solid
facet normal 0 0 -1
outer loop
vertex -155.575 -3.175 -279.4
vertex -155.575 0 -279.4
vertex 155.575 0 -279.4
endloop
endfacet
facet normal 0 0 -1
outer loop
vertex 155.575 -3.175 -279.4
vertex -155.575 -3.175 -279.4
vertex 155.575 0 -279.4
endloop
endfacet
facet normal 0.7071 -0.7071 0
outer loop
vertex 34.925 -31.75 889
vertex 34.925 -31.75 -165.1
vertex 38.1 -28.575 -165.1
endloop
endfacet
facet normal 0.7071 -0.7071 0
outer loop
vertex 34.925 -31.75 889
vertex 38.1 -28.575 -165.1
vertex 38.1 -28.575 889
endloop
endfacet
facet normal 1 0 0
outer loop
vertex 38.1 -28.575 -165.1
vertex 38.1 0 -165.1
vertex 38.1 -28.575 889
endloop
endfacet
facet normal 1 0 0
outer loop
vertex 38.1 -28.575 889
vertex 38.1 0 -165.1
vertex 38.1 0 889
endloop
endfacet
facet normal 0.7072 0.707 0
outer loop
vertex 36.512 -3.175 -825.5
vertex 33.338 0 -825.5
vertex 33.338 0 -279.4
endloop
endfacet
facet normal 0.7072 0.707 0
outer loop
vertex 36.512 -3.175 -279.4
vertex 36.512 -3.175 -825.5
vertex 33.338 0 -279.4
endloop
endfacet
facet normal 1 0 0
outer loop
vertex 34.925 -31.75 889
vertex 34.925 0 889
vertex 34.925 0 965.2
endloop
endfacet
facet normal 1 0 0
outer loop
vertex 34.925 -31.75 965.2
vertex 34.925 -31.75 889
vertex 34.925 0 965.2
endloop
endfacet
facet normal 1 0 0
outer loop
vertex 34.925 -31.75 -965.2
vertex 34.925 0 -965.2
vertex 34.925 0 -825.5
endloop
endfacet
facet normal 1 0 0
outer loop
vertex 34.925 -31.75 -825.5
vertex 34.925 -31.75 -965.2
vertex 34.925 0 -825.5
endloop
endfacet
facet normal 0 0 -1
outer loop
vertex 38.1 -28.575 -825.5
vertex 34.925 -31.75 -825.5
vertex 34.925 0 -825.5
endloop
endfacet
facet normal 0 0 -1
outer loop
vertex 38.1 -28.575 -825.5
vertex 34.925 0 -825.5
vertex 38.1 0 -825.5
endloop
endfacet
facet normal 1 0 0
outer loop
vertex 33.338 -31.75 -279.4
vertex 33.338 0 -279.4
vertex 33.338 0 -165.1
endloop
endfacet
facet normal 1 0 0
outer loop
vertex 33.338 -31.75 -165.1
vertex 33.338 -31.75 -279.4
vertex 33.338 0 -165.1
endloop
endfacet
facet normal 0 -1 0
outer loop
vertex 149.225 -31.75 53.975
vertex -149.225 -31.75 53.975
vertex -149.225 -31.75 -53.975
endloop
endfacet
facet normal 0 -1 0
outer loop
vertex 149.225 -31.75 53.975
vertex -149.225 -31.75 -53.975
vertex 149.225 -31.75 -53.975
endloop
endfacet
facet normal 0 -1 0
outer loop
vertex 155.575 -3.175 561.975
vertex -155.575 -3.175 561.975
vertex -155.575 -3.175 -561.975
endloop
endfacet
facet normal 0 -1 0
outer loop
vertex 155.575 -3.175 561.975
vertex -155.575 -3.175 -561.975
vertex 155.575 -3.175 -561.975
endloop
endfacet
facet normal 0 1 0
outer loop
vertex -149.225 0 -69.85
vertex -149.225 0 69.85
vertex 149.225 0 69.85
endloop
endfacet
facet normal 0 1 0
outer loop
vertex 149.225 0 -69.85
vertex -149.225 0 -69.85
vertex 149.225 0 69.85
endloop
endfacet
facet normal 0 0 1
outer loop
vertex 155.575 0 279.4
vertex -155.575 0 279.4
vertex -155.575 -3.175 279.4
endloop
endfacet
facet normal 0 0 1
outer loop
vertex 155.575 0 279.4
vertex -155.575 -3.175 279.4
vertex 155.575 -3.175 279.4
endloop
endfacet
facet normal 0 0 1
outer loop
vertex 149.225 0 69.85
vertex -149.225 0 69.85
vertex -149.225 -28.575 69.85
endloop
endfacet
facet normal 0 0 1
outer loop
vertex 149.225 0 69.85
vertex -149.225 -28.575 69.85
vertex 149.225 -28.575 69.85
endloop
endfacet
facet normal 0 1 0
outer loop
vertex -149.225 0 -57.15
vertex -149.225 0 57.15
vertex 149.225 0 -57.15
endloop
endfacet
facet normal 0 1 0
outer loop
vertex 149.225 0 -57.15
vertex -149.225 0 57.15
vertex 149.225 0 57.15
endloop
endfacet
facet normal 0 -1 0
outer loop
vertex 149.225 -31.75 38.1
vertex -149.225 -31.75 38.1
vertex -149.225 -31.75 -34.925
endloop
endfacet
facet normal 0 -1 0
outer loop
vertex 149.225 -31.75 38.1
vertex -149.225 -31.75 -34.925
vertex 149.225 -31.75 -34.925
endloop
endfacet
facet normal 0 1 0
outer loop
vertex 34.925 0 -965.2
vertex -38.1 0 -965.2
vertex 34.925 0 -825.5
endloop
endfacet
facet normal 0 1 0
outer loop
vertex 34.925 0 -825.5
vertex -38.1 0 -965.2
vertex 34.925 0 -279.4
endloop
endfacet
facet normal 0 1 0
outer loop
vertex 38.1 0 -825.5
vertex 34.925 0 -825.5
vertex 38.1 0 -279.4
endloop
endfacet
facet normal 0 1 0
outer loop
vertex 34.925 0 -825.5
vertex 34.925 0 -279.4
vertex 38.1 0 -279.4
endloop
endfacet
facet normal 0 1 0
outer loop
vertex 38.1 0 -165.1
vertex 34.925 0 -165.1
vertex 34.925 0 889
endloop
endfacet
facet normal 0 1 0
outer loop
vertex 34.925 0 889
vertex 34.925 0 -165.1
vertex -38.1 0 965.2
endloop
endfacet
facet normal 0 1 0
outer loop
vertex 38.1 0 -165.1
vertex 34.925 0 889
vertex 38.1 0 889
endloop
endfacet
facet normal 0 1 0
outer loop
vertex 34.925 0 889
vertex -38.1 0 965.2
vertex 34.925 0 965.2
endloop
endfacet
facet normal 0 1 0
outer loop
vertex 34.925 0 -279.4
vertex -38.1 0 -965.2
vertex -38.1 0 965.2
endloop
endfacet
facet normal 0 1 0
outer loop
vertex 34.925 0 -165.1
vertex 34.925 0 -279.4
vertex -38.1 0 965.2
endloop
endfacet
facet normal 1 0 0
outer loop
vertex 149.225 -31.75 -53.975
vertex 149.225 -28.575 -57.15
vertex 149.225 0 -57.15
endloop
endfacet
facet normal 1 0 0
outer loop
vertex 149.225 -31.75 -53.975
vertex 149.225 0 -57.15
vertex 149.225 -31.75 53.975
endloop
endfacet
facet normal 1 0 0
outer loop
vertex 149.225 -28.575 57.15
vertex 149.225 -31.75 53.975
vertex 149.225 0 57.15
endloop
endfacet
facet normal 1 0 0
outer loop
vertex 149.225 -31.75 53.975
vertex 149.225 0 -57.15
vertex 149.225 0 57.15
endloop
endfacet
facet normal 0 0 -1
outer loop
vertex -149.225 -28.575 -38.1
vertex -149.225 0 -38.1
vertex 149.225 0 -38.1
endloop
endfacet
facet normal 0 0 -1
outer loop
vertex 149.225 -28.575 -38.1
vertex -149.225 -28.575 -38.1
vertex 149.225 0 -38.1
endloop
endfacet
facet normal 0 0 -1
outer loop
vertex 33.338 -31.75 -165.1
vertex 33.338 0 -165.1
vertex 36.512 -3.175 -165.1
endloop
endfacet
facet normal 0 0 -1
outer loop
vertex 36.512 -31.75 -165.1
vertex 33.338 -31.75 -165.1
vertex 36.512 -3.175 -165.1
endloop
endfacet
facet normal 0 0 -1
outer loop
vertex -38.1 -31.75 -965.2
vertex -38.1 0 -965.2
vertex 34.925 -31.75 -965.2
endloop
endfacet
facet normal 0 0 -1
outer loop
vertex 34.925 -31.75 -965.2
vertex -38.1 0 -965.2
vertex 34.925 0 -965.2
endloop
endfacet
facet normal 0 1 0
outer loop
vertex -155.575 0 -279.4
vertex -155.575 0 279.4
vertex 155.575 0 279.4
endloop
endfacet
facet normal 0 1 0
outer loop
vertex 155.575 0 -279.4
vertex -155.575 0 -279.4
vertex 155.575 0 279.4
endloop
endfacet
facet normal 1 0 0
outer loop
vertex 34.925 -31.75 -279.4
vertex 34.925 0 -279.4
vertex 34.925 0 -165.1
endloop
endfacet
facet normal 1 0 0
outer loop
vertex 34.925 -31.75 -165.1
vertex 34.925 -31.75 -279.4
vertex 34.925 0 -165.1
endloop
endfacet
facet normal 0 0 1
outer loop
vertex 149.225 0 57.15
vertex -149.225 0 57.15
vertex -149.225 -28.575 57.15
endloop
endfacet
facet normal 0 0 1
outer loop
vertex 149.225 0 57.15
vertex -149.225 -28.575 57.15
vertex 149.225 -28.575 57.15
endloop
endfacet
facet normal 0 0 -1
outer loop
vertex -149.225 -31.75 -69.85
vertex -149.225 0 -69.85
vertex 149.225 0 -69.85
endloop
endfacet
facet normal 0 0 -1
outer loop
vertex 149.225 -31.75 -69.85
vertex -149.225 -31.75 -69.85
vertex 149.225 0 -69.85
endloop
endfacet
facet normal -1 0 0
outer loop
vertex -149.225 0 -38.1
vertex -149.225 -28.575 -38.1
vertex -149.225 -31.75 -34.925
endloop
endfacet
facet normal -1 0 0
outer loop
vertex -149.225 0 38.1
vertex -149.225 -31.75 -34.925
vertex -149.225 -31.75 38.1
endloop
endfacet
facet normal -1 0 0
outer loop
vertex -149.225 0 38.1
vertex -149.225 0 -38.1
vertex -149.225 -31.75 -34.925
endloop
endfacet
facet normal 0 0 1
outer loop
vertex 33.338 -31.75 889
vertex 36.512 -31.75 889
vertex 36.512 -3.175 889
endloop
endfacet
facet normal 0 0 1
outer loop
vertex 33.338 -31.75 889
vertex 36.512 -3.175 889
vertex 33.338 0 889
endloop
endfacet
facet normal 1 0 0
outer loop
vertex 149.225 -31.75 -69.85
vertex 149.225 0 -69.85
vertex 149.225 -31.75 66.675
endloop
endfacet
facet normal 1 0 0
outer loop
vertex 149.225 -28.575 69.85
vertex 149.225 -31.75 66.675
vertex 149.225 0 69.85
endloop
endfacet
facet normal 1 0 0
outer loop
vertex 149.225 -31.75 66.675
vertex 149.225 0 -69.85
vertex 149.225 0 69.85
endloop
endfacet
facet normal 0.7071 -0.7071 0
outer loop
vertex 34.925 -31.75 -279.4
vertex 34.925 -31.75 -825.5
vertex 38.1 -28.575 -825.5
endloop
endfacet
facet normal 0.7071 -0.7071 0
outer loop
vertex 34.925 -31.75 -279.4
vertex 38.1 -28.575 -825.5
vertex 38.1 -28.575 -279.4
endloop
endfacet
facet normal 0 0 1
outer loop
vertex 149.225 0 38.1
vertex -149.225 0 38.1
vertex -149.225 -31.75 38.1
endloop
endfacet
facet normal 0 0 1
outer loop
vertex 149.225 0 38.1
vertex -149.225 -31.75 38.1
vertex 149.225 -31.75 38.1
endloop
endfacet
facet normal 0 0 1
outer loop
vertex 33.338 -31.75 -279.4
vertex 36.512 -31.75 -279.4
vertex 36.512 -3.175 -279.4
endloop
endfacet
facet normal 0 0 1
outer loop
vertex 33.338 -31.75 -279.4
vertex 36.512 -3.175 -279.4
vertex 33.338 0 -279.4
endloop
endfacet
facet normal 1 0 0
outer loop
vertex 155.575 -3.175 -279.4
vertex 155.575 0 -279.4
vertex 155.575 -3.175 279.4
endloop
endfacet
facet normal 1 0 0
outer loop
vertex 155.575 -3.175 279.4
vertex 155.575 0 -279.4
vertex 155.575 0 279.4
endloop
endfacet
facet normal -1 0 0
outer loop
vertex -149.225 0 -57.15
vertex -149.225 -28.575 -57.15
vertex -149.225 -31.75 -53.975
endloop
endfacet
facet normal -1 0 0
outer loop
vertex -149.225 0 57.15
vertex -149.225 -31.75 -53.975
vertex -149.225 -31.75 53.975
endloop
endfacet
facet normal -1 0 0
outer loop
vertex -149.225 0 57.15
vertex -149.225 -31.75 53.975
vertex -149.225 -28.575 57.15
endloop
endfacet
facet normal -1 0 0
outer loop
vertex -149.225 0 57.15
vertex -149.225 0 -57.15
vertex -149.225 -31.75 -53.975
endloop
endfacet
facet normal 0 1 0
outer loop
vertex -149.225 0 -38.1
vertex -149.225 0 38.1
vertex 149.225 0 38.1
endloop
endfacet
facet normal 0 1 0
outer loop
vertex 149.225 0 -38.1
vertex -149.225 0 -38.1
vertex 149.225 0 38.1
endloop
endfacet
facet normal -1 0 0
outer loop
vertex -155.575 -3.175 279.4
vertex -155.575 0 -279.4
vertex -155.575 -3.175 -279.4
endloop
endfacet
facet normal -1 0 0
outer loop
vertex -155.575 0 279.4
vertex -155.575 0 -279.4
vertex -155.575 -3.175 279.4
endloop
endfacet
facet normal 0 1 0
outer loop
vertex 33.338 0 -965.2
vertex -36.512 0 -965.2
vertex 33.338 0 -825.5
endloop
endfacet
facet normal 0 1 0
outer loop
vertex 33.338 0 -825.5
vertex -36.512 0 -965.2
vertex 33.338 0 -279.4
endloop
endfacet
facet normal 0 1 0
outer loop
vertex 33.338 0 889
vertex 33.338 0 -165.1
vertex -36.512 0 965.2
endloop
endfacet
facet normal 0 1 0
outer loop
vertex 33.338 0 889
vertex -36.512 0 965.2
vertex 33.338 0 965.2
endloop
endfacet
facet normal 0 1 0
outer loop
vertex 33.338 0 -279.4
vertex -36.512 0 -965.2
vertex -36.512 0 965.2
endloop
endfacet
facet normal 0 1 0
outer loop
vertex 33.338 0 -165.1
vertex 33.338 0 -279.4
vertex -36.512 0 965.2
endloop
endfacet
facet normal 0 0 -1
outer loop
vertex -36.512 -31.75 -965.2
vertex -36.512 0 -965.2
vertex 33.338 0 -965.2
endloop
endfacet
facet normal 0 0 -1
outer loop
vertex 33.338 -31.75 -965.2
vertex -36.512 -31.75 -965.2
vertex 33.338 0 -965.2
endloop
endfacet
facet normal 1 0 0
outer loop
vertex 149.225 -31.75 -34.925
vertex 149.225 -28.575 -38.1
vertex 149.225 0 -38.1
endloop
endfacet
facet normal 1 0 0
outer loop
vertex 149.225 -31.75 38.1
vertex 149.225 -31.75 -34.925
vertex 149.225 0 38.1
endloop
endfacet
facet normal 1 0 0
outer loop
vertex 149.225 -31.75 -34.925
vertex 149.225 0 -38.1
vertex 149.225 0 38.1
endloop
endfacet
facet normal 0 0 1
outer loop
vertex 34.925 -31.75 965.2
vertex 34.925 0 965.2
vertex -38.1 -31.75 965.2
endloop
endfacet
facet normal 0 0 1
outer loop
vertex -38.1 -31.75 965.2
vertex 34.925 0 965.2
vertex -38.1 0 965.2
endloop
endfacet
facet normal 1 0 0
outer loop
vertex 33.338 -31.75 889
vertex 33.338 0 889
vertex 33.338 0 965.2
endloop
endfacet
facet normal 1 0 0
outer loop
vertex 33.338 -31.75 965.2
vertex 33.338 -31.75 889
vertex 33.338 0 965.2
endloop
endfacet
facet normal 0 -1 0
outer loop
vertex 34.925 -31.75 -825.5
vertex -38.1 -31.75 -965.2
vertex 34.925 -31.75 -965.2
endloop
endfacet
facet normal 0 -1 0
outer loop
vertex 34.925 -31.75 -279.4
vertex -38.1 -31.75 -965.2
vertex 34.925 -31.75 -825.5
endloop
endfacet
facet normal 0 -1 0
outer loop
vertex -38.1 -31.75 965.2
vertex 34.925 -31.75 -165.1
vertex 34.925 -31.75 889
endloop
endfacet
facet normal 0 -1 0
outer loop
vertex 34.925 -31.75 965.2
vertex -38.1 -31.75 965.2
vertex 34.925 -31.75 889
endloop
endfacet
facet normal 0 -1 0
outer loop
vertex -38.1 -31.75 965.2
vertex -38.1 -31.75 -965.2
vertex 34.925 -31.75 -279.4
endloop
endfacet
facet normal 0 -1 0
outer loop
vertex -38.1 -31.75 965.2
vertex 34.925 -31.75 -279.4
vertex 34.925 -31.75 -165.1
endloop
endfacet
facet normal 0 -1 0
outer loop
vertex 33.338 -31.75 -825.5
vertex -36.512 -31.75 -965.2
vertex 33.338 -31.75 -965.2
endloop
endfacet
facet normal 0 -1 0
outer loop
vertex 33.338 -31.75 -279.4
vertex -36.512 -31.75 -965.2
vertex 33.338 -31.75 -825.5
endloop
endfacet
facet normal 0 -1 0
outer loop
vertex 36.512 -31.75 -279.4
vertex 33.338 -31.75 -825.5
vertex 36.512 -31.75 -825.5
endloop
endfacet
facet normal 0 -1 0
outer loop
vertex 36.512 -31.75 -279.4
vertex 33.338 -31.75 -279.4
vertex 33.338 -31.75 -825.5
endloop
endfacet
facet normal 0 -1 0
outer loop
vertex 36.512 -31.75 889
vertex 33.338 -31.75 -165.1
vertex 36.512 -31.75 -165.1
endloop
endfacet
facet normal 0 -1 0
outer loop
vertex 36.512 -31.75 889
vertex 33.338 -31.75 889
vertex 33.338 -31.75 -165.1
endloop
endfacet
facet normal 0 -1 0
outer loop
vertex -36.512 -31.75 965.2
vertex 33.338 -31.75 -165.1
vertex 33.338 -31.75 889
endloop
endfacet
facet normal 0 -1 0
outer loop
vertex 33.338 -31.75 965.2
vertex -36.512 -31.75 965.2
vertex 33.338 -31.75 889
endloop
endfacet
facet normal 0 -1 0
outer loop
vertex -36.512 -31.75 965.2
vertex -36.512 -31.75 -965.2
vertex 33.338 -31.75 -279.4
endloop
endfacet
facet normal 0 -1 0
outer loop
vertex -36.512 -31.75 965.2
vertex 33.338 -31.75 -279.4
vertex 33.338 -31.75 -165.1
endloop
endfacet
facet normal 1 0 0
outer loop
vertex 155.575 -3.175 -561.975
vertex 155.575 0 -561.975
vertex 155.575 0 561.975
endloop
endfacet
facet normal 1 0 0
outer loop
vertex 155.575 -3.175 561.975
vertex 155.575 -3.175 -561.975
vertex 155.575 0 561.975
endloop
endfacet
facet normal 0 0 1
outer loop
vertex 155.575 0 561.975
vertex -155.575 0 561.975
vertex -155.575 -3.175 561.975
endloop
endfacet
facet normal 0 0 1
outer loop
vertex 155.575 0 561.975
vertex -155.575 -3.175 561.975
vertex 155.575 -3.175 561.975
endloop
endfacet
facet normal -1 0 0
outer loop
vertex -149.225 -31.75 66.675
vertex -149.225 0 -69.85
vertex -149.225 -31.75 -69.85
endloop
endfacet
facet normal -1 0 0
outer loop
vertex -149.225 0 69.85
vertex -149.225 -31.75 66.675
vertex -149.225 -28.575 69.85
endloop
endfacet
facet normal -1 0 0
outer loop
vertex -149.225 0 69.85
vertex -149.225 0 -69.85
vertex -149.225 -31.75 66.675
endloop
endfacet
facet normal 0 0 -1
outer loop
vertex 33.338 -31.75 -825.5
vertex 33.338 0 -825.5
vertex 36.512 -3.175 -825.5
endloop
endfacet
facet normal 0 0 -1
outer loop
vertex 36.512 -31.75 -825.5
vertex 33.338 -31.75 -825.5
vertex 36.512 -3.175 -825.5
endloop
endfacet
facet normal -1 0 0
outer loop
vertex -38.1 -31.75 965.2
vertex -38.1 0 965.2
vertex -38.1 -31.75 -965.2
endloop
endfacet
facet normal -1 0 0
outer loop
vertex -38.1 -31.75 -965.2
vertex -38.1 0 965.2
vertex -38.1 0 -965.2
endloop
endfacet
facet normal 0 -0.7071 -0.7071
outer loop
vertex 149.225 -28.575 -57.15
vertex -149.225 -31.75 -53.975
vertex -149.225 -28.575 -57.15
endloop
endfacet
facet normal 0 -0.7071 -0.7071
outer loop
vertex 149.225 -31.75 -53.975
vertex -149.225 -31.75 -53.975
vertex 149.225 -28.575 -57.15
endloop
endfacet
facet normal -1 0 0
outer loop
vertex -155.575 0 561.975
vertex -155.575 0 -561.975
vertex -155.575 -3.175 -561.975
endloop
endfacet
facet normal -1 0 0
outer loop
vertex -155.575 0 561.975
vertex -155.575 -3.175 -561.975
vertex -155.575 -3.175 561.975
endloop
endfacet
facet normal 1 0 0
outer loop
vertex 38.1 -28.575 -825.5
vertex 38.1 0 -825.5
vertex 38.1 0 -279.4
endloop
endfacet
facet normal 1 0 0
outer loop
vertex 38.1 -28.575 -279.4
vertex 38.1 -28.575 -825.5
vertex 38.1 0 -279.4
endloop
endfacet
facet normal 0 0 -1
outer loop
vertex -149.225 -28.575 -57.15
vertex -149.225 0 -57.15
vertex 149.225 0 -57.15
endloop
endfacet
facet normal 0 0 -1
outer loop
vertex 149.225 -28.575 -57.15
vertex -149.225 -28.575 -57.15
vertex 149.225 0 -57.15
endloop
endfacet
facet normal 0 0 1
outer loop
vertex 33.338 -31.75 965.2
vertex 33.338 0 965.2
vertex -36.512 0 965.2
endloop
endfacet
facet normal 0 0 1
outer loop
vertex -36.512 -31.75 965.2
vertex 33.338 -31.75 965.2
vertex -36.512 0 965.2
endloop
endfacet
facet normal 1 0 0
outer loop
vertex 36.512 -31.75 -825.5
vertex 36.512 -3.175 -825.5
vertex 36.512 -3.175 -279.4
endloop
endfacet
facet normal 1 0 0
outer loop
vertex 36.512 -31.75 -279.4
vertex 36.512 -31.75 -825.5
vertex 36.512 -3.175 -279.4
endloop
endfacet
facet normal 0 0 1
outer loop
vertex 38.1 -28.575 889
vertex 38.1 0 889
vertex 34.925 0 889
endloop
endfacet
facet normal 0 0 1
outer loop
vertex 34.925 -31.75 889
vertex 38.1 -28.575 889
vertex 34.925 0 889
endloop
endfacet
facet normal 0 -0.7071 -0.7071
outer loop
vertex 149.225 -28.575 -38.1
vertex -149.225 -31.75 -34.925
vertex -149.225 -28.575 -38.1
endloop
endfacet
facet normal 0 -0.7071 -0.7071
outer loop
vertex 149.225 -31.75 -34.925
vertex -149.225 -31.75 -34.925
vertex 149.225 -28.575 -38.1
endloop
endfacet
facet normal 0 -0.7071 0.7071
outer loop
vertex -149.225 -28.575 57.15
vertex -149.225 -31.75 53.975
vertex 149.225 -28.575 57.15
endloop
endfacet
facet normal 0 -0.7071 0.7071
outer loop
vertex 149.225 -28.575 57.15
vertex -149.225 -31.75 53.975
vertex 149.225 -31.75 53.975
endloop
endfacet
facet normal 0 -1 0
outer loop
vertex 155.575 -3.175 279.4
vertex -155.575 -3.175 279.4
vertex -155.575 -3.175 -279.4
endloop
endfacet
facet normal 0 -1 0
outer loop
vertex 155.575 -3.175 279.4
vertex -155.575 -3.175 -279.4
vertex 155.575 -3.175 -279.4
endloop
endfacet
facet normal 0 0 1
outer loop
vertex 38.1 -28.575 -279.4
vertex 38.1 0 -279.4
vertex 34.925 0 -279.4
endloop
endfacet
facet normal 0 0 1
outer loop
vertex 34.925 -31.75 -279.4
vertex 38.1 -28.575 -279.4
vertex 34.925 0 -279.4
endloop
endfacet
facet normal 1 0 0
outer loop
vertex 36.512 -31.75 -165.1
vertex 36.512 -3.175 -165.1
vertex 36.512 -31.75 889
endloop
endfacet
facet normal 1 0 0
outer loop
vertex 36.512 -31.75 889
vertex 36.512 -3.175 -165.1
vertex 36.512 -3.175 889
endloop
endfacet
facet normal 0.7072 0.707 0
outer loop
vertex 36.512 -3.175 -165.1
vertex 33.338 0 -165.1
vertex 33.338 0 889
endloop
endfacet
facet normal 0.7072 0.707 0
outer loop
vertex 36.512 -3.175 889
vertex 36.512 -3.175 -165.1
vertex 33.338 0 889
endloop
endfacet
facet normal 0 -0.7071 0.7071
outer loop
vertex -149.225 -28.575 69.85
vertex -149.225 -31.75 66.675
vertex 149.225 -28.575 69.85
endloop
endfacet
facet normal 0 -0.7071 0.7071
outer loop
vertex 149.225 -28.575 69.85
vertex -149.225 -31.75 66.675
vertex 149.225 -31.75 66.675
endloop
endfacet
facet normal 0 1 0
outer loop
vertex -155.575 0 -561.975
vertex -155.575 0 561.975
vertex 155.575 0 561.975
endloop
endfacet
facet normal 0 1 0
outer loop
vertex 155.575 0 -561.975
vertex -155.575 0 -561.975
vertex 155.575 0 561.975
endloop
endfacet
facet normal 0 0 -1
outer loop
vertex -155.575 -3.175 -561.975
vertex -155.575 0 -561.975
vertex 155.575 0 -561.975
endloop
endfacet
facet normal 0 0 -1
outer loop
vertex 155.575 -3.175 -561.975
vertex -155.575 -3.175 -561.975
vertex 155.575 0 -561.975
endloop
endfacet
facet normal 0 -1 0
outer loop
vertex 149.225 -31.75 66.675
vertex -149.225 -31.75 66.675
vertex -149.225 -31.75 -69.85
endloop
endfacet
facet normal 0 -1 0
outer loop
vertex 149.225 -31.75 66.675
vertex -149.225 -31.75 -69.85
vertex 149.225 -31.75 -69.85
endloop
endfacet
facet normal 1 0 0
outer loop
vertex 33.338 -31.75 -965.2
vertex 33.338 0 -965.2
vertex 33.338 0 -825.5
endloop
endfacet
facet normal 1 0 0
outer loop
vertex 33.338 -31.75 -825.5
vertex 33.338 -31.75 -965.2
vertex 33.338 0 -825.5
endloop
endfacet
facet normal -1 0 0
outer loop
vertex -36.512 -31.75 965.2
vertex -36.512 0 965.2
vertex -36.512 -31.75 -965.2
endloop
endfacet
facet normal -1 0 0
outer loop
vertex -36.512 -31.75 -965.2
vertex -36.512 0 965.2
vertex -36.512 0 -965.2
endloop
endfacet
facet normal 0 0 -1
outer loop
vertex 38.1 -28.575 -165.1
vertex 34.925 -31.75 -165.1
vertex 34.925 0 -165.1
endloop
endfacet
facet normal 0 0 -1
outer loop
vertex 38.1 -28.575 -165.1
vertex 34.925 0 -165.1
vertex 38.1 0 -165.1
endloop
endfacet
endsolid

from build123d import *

# Parameters (mm, degrees)
F1_DEPTH  = 31.75
F2_W      = 298.45
F2_H      = 139.7
F3_DEPTH  = 31.75
F4_W      = 298.45
F4_H      = 76.2
F5_DEPTH  = 31.75
F6_W      = 298.45
F6_H      = 114.3
F7_DEPTH  = 31.75
F8_SIZE   = 3.175
F9_SIZE   = 3.175
F10_SIZE  = 3.175
F11_SIZE  = 3.175
F13_DEPTH = 31.75
F14_SIZE  = 3.175
F15_W     = 311.15
F15_H     = 1123.95
F16_DEPTH = 3.175
F17_W     = 311.15
F17_H     = 558.8
F18_DEPTH = 3.175


with BuildPart() as f1:
    # F0 (on Front) → F1 (new body)
    with BuildSketch(Plane.XZ):
        Polygon((34.925, 889), (34.925, 965.2), (-38.1, 965.2), (-38.1, -965.2), (34.925, -965.2), (34.925, -825.5), (38.1, -825.5), (38.1, -279.4), (34.925, -279.4), (34.925, -165.1), (38.1, -165.1), (38.1, 889), align=None)
    extrude(amount=F1_DEPTH)

    # F8
    f8_edges = [f1.edges().sort_by_distance(p)[0] for p in [
        (38.1, -31.75, 361.95),
        (38.1, -31.75, -552.45),
    ]]
    chamfer(f8_edges, length=F8_SIZE)


with BuildPart() as f3:
    # F2 (on Front) → F3 (new body)
    with BuildSketch(Plane.XZ):
        Rectangle(F2_W, F2_H)
    extrude(amount=F3_DEPTH)

    # F9
    f9_edges = [f3.edges().sort_by_distance(p)[0] for p in [
        (0, -31.75, 69.85),
    ]]
    chamfer(f9_edges, length=F9_SIZE)


with BuildPart() as f5:
    # F4 (on Front) → F5 (new body)
    with BuildSketch(Plane.XZ):
        Rectangle(F4_W, F4_H)
    extrude(amount=F5_DEPTH)

    # F10
    f10_edges = [f5.edges().sort_by_distance(p)[0] for p in [
        (0, -31.75, -38.1),
    ]]
    chamfer(f10_edges, length=F10_SIZE)


with BuildPart() as f7:
    # F6 (on Front) → F7 (new body)
    with BuildSketch(Plane.XZ):
        Rectangle(F6_W, F6_H)
    extrude(amount=F7_DEPTH)

    # F11
    f11_edges = [f7.edges().sort_by_distance(p)[0] for p in [
        (0, -31.75, -57.15),
        (0, -31.75, 57.15),
    ]]
    chamfer(f11_edges, length=F11_SIZE)


with BuildPart() as f13:
    # F12 (on Front) → F13 (new body)
    with BuildSketch(Plane.XZ):
        Polygon((-36.5125, -965.2), (33.3375, -965.2), (33.3375, -825.5), (36.5125, -825.5), (36.5125, -279.4), (33.3375, -279.4), (33.3375, -165.1), (36.5125, -165.1), (36.5125, 889), (33.3375, 889), (33.3375, 965.2), (-36.5125, 965.2), align=None)
    extrude(amount=F13_DEPTH)

    # F14
    f14_edges = [f13.edges().sort_by_distance(p)[0] for p in [
        (36.5125, 0, 361.95),
        (36.5125, 0, -552.45),
    ]]
    chamfer(f14_edges, length=F14_SIZE)


with BuildPart() as f16:
    # F15 (on Front) → F16 (new body)
    with BuildSketch(Plane.XZ):
        Rectangle(F15_W, F15_H)
    extrude(amount=F16_DEPTH)


with BuildPart() as f18:
    # F17 (on Front) → F18 (new body)
    with BuildSketch(Plane.XZ):
        Rectangle(F17_W, F17_H)
    extrude(amount=F18_DEPTH)


solid = Compound([f1.part, f3.part, f5.part, f7.part, f13.part, f16.part, f18.part])
